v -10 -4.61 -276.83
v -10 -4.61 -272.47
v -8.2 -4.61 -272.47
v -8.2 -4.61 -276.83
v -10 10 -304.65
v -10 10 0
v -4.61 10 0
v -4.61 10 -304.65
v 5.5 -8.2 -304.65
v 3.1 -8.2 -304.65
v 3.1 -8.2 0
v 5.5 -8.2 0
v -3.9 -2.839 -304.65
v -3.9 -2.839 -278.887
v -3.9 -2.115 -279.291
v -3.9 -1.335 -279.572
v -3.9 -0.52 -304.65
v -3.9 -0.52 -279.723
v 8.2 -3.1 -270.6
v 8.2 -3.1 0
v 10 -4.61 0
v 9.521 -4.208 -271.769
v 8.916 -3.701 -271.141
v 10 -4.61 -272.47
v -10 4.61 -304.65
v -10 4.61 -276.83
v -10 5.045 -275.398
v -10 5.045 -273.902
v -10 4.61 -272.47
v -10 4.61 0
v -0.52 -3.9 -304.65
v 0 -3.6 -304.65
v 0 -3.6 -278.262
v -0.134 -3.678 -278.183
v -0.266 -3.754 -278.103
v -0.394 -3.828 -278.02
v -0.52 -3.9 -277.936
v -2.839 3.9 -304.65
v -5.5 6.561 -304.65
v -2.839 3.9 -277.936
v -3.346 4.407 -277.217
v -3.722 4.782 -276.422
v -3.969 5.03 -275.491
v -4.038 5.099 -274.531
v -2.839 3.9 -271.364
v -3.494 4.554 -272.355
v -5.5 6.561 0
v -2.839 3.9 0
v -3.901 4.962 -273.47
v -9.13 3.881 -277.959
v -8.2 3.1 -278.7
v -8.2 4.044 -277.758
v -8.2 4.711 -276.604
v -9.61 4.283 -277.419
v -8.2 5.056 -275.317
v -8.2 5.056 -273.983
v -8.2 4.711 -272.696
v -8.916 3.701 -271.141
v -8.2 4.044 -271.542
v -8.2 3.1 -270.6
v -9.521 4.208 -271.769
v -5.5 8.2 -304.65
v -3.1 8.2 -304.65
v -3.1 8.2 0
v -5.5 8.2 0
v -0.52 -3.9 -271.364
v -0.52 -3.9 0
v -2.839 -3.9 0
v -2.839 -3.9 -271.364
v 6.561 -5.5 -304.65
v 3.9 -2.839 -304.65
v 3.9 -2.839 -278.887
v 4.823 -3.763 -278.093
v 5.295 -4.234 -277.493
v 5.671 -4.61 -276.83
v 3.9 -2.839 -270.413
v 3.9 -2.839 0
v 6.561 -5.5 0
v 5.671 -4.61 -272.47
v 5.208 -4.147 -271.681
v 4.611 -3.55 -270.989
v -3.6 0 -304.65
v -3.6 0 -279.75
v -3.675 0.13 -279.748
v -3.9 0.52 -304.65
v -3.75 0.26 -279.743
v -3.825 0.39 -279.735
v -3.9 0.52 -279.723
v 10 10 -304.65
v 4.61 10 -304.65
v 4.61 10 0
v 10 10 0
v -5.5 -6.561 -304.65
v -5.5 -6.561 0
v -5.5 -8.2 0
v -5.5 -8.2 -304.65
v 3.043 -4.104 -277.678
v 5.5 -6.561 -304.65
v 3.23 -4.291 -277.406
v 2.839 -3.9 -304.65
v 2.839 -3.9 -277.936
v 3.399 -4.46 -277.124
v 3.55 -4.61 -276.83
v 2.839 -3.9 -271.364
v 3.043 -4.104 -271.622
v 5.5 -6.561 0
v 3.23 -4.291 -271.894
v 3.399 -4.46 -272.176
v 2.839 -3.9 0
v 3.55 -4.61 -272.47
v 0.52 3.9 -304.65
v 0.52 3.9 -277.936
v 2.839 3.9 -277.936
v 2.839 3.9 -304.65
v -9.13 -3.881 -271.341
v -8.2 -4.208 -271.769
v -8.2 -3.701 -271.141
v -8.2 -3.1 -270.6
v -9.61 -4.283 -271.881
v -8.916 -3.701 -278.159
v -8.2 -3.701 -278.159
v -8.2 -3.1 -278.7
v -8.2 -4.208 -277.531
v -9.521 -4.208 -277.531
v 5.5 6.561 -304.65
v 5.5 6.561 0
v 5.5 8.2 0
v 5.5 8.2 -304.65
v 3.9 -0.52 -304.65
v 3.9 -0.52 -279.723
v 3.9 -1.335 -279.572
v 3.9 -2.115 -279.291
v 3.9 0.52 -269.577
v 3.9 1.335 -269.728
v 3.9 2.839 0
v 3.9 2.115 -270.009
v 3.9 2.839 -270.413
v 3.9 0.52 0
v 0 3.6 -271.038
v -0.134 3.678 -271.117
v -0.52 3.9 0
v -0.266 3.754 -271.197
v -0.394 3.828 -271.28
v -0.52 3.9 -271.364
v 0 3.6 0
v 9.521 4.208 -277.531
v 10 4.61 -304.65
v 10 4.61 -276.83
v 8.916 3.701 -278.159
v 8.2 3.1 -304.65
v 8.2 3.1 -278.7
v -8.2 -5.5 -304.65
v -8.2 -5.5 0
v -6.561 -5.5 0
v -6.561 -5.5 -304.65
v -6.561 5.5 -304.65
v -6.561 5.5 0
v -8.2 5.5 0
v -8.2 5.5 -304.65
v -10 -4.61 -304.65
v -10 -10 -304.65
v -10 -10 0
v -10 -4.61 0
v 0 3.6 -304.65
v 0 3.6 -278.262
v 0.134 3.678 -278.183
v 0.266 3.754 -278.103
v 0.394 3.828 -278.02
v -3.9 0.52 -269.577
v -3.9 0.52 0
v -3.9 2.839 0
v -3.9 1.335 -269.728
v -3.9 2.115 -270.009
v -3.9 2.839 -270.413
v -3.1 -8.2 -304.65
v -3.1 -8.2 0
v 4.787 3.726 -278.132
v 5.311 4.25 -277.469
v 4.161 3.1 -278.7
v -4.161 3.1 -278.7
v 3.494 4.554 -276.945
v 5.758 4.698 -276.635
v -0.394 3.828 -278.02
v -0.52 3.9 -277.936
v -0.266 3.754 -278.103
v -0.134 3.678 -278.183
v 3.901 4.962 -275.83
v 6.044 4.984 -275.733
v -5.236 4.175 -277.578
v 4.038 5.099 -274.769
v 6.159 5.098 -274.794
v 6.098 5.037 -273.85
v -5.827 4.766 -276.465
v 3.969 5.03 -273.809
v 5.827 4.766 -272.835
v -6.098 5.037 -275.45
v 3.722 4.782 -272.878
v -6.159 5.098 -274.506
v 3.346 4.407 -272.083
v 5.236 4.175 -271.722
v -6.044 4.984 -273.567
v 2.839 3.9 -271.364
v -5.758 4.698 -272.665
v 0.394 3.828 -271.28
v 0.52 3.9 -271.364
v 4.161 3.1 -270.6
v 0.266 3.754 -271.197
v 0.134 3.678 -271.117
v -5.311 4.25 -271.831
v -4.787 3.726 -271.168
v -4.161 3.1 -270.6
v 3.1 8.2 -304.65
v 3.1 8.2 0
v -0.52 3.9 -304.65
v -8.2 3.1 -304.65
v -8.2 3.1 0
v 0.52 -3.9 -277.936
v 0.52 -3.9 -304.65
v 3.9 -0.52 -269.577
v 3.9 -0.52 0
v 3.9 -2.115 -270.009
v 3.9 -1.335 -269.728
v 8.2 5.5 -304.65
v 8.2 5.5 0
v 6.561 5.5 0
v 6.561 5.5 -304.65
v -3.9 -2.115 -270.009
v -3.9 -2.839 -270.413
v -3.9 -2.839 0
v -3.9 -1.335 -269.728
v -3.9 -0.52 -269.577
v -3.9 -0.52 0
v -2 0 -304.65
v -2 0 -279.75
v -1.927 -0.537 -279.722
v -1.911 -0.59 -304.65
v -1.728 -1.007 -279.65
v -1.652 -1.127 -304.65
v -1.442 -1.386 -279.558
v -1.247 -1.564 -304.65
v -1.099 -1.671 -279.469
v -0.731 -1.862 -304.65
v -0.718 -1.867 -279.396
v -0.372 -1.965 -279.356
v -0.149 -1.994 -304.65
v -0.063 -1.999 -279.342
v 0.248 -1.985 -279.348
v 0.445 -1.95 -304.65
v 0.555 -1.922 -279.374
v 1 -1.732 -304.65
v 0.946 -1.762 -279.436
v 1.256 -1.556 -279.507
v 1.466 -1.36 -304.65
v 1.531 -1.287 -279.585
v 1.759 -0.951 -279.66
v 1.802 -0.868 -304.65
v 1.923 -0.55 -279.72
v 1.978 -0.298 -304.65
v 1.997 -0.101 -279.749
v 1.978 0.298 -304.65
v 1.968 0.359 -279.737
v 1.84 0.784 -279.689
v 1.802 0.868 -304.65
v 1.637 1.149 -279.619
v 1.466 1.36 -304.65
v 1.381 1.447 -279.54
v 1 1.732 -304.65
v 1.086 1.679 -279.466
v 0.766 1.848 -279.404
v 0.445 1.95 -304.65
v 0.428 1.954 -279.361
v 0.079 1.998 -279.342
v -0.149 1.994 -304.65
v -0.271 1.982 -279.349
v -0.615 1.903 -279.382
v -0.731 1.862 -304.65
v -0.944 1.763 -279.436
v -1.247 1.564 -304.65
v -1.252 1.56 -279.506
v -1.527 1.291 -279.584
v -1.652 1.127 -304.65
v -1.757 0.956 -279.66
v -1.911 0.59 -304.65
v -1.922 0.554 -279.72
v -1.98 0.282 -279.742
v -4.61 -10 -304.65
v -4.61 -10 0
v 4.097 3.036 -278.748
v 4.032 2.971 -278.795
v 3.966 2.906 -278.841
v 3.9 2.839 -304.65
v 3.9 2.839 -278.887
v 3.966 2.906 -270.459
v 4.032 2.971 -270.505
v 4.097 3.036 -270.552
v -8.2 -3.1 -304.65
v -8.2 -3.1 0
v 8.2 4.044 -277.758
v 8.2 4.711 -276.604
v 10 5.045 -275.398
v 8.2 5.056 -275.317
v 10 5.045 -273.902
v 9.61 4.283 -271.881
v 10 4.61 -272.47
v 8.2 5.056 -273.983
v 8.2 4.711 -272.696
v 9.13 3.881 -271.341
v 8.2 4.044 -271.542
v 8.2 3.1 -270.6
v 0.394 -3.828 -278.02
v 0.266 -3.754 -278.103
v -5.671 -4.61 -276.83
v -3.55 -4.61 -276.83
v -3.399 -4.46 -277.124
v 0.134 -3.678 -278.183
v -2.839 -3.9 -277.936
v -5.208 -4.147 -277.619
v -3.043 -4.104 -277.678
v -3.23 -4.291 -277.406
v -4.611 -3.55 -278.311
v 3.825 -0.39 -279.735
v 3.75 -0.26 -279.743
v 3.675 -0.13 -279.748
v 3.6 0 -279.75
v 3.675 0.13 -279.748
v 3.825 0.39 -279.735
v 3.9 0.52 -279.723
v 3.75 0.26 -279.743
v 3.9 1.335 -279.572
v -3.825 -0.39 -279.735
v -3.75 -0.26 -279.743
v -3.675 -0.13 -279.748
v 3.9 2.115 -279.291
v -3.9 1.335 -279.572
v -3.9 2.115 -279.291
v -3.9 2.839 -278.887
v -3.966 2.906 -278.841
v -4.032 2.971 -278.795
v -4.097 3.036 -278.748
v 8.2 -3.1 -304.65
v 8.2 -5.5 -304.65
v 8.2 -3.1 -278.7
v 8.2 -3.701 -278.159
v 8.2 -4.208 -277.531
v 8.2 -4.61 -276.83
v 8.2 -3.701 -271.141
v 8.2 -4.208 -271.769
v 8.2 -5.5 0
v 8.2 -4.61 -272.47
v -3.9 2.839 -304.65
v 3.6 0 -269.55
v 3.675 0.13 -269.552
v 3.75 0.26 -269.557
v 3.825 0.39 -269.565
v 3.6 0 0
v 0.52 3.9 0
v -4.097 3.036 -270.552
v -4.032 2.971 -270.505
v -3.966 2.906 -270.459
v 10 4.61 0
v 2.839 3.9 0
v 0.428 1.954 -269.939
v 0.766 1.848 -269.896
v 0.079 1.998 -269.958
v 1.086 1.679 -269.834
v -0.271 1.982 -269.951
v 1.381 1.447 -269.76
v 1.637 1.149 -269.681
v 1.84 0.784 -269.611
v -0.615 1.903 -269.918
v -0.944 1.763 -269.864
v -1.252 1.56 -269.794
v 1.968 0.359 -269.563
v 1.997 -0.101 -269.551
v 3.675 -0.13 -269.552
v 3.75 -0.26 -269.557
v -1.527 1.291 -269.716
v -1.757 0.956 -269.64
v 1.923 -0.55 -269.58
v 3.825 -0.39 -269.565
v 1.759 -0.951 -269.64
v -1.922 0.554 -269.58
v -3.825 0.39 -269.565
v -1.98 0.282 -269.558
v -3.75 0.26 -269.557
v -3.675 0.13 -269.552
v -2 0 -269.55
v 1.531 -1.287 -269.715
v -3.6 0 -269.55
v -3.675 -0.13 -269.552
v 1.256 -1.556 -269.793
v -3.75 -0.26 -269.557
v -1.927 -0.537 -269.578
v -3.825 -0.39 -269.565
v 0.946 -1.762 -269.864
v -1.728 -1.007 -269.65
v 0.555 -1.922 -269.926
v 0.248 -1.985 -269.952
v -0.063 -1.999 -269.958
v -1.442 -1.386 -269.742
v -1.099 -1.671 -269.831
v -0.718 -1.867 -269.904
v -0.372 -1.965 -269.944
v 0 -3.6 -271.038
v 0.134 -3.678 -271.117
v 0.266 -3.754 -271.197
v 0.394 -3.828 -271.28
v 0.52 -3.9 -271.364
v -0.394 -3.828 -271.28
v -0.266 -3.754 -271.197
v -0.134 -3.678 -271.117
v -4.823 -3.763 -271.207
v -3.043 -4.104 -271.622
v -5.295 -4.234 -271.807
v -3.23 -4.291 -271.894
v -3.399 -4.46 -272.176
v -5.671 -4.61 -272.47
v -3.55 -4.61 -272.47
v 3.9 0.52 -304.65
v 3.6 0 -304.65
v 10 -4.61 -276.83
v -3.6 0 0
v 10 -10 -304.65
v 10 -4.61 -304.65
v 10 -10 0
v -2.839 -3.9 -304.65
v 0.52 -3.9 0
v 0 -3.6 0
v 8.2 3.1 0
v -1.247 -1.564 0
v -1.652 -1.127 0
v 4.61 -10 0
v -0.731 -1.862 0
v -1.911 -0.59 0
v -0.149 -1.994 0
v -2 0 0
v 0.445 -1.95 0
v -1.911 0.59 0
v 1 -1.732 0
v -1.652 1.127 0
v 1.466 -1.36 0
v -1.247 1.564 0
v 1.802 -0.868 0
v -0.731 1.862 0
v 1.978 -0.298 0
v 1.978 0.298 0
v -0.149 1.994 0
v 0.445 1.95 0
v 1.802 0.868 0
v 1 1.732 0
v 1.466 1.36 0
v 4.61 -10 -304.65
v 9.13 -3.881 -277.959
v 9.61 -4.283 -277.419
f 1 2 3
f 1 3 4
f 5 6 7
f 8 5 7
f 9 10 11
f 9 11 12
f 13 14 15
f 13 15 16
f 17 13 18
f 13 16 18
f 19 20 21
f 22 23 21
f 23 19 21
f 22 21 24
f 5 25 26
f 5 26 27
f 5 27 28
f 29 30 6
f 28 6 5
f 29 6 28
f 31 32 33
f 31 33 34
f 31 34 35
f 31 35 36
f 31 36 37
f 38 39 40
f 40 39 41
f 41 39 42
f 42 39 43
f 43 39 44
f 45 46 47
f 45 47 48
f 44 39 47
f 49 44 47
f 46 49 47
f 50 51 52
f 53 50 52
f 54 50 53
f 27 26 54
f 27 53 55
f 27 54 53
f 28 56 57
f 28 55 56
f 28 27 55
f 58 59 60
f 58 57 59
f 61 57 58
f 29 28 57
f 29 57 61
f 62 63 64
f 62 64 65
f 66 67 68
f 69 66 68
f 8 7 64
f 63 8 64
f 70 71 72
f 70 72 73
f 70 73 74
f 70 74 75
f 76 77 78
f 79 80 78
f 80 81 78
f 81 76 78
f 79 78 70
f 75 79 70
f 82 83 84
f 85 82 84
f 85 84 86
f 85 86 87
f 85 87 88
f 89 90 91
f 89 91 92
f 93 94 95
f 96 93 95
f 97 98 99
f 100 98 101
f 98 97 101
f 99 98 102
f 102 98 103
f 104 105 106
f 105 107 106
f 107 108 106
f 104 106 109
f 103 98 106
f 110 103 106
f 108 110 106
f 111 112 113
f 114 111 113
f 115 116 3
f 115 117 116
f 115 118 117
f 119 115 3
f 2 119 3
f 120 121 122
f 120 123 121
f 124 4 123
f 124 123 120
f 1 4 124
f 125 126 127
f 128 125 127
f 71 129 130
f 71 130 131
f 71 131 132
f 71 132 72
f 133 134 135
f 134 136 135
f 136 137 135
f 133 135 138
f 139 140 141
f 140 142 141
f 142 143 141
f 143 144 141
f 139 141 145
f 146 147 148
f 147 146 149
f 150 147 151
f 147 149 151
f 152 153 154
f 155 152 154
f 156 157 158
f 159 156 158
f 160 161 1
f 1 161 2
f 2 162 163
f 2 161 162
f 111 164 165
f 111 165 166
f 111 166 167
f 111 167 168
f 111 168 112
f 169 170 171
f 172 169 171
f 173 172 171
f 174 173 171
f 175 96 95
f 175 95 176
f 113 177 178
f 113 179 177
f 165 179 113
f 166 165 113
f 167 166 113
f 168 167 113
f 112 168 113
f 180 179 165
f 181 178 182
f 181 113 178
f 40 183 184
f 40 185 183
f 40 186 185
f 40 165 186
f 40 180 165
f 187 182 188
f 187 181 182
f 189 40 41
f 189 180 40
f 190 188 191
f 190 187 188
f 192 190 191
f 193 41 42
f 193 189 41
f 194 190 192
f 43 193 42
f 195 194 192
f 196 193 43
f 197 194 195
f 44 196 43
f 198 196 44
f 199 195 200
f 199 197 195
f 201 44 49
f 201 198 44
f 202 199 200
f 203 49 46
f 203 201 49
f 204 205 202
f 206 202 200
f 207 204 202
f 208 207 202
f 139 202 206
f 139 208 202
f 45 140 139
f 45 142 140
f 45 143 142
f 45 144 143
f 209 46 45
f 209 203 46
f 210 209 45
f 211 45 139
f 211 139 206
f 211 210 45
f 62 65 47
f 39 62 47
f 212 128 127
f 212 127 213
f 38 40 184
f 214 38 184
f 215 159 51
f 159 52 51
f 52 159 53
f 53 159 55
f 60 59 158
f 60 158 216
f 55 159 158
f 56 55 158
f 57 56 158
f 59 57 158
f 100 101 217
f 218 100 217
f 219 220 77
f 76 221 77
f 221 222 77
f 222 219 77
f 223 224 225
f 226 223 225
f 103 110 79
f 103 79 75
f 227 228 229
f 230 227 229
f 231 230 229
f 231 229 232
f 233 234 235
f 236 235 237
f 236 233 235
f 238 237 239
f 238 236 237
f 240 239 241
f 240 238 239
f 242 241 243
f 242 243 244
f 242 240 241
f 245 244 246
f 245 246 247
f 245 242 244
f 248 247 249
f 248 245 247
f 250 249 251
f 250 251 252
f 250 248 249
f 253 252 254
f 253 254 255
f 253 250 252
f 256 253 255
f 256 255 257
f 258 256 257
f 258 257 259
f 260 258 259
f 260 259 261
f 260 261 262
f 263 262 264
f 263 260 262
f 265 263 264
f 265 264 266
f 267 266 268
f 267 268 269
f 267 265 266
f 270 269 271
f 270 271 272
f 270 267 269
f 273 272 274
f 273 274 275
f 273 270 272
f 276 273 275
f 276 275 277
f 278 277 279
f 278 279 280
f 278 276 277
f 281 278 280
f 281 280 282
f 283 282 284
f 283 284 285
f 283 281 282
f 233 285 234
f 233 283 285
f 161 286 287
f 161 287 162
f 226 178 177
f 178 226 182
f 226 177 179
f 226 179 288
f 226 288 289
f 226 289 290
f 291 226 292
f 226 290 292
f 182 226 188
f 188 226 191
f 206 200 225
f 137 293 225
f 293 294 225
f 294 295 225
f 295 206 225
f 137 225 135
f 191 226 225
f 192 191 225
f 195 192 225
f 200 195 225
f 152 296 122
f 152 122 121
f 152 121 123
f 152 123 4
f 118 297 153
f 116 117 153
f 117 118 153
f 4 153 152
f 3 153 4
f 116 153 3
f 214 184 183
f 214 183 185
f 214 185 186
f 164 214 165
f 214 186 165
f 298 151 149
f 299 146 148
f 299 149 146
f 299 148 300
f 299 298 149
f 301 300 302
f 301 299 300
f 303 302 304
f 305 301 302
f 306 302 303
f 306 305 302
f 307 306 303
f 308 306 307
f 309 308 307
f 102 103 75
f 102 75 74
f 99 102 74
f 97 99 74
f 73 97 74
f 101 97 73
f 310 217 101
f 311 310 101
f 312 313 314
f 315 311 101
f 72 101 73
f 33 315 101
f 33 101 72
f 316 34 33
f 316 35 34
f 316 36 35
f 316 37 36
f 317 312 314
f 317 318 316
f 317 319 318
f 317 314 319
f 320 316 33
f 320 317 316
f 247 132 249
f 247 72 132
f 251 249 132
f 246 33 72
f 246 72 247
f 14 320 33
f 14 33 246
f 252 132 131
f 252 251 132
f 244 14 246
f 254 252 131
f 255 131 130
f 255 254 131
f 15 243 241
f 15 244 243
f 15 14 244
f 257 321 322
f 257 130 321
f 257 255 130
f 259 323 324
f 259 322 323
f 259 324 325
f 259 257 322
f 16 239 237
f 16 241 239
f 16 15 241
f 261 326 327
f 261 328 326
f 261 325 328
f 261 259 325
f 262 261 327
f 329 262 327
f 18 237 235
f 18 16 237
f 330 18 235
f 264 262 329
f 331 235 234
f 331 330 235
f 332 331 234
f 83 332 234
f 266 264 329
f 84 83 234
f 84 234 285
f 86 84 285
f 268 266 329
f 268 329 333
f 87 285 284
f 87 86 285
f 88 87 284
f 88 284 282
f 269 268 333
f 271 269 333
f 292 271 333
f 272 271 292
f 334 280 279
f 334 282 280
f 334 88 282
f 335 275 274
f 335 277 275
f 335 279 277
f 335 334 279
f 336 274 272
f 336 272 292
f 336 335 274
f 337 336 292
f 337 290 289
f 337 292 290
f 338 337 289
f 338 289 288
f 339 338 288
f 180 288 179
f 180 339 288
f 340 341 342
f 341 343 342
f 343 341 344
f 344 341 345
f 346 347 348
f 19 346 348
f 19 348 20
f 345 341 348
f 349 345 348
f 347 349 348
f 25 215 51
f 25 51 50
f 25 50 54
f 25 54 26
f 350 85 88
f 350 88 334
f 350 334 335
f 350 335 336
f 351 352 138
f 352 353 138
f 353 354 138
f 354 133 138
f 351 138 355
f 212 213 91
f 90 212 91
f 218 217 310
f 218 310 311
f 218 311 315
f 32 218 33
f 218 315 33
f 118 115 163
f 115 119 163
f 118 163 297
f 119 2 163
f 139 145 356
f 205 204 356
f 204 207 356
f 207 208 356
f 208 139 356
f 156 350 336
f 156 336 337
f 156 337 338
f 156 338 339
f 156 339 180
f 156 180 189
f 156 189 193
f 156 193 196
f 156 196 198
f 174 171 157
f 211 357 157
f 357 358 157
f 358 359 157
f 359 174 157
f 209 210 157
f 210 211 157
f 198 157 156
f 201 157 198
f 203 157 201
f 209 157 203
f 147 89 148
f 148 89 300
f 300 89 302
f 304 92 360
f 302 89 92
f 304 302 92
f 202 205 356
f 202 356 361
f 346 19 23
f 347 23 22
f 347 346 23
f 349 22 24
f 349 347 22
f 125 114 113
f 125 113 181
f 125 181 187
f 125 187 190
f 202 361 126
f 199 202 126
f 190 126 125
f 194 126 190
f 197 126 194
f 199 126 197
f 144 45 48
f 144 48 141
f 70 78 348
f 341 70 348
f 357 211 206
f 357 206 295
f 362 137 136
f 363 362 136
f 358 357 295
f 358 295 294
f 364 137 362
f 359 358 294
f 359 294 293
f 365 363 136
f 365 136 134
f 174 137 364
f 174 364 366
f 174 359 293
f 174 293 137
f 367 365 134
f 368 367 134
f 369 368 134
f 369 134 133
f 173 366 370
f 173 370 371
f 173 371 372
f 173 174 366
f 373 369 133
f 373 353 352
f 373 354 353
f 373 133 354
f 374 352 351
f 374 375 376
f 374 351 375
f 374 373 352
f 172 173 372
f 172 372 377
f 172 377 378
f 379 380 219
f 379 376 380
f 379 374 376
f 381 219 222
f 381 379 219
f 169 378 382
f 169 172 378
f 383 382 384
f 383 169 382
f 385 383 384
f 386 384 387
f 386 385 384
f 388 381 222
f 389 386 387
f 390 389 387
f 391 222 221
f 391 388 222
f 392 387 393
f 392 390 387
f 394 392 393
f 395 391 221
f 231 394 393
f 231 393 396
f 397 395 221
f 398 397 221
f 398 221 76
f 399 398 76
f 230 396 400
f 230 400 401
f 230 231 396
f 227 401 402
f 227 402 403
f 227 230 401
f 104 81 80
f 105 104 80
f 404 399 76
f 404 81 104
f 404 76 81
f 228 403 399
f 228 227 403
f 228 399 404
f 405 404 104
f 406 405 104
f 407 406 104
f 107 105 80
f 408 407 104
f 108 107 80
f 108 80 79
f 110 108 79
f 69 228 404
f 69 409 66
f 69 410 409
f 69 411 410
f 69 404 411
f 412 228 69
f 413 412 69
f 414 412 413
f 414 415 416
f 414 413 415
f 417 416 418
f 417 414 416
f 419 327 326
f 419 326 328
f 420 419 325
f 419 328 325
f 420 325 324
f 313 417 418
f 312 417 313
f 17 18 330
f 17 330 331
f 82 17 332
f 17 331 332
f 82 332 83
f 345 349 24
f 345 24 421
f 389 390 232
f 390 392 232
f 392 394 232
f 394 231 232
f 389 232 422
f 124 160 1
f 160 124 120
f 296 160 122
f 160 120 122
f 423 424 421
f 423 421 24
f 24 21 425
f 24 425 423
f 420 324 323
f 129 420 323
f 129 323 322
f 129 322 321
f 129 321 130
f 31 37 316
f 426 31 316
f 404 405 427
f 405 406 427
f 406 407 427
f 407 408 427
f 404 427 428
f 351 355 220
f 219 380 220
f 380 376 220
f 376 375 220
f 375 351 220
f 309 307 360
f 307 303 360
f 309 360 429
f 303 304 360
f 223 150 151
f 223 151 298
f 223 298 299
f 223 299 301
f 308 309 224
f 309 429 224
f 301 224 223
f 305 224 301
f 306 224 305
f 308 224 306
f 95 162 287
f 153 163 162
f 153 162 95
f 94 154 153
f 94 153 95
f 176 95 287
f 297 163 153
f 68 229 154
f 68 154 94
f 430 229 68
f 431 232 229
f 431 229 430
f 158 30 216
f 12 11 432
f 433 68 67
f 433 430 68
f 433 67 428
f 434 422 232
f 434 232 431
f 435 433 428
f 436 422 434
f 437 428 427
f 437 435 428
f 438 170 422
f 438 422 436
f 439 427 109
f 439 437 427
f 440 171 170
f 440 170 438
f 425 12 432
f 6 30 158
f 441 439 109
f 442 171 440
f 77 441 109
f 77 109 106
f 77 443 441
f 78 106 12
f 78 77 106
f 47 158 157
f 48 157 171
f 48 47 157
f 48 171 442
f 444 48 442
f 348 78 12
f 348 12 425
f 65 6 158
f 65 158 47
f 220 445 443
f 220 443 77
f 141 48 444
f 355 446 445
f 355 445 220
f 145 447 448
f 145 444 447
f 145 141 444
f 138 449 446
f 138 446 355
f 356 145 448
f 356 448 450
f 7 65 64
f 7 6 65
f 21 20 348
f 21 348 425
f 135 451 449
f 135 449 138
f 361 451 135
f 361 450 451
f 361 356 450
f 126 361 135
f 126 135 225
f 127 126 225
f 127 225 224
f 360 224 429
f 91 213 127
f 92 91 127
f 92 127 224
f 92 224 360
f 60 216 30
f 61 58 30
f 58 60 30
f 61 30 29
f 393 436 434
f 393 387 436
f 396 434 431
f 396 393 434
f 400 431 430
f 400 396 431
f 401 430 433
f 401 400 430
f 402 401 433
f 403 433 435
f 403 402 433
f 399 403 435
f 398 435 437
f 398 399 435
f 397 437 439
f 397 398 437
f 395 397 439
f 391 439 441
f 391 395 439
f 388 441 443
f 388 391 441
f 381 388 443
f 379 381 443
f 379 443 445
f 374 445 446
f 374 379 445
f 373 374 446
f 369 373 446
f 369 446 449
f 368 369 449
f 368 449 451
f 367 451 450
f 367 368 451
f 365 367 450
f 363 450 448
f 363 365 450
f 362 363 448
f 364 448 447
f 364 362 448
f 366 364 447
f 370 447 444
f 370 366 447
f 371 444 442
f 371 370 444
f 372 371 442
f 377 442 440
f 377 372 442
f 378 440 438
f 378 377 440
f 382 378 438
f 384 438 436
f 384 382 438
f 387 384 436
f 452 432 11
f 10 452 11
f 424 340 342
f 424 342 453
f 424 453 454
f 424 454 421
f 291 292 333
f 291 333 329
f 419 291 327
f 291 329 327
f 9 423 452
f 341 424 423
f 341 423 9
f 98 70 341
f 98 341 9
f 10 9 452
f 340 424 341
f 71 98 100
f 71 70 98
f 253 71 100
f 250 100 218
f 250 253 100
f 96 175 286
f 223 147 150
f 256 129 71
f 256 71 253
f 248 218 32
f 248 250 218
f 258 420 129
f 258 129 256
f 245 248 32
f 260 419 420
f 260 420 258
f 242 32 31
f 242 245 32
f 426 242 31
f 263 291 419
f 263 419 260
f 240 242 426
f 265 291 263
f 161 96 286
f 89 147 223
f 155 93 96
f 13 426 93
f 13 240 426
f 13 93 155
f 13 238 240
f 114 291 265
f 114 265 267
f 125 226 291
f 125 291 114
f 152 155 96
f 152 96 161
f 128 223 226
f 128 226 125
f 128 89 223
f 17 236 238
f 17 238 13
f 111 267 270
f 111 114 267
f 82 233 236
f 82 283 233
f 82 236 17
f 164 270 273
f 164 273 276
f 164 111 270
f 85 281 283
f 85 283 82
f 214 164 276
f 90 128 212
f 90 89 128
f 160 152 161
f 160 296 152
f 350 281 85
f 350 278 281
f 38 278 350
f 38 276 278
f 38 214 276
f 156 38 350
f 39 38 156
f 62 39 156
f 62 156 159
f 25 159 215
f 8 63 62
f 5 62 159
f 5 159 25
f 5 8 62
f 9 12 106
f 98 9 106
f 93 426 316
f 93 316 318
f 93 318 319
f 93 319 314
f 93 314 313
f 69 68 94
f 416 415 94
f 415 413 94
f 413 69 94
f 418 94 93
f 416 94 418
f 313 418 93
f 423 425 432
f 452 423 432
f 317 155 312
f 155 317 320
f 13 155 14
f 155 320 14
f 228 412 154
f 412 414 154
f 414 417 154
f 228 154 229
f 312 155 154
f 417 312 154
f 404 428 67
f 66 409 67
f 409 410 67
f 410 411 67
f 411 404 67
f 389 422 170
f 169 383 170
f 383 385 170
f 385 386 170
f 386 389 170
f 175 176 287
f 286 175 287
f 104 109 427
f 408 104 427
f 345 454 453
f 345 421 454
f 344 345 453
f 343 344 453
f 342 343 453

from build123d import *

# Parameters (mm, degrees)
SKETCH1_R           = 2
BOSS_EXTRUDE1_DEPTH = 304.65
CUT_EXTRUDE1_START  = -20
CUT_EXTRUDE1_DEPTH  = 20
CUT_EXTRUDE2_START  = -304.65
SKETCH4_R           = 2
CUT_EXTRUDE2_DEPTH  = 304.65


# Read off the part's stored shape, not the designer's step: Cut-Extrude1
with BuildPart() as part:
    # Sketch1 → Boss-Extrude1 (new, symmetric)
    with BuildSketch(Plane.XY):
        Polygon((10, 10), (10, 4.610379336), (8.2, 3.1), (8.2, 5.5), (6.560660172, 5.5), (3.9, 2.839339828), (3.9, 0.519615242), (3.6, 0), (3.9, -0.519615242), (3.9, -2.839339828), (6.560660172, -5.5), (8.2, -5.5), (8.2, -3.1), (10, -4.610379336), (10, -10), (4.610379336, -10), (3.1, -8.2), (5.5, -8.2), (5.5, -6.560660172), (2.839339828, -3.9), (0.519615242, -3.9), (0, -3.6), (-0.519615242, -3.9), (-2.839339828, -3.9), (-5.5, -6.560660172), (-5.5, -8.2), (-3.1, -8.2), (-4.610379336, -10), (-10, -10), (-10, -4.610379336), (-8.2, -3.1), (-8.2, -5.5), (-6.560660172, -5.5), (-3.9, -2.839339828), (-3.9, -0.519615242), (-3.6, 0), (-3.9, 0.519615242), (-3.9, 2.839339828), (-6.560660172, 5.5), (-8.2, 5.5), (-8.2, 3.1), (-10, 4.610379336), (-10, 10), (-4.610379336, 10), (-3.1, 8.2), (-5.5, 8.2), (-5.5, 6.560660172), (-2.839339828, 3.9), (-0.519615242, 3.9), (0, 3.6), (0.519615242, 3.9), (2.839339828, 3.9), (5.5, 6.560660172), (5.5, 8.2), (3.1, 8.2), (4.610379336, 10), align=None)
        with Locations(Location((0, 0, 0), (0, 0, 180))):
            Circle(SKETCH1_R, mode=Mode.SUBTRACT)
    extrude(amount=BOSS_EXTRUDE1_DEPTH, both=True)

    # Cut-Extrude1 outline → Cut-Extrude1 (cut)
    with BuildSketch(Plane(origin=(10, 0, 0), x_dir=(0, 0, -1), z_dir=(1, 0, 0)).offset(CUT_EXTRUDE1_START)):
        with BuildLine():
            Line((272.469540788, -4.610379336), (276.830459212, -4.610379336))
            ThreePointArc((276.830459212, -4.610379336), (279.606428288, -1.201590041), (278.699691346, 3.1))
            ThreePointArc((278.699691346, 3.1), (274.65, 5.1), (270.600308654, 3.1))
            ThreePointArc((270.600308654, 3.1), (269.693571712, -1.201590041), (272.469540788, -4.610379336))
        make_face()
    extrude(amount=CUT_EXTRUDE1_DEPTH, mode=Mode.SUBTRACT)

    # Sketch4 → Cut-Extrude2 (cut)
    with BuildSketch(Plane.XY.offset(304.65).offset(CUT_EXTRUDE2_START)):
        Polygon((-5.5, 6.560660172), (-5.5, 8.2), (-3.1, 8.2), (-4.610379336, 10), (-10, 10), (-10, 4.610379336), (-8.2, 3.1), (-8.2, 5.5), (-6.560660172, 5.5), (-3.9, 2.839339828), (-3.9, 0.519615242), (-3.6, 0), (-3.9, -0.519615242), (-3.9, -2.839339828), (-6.560660172, -5.5), (-8.2, -5.5), (-8.2, -3.1), (-10, -4.610379336), (-10, -10), (-4.610379336, -10), (-3.1, -8.2), (-5.5, -8.2), (-5.5, -6.560660172), (-2.839339828, -3.9), (-0.519615242, -3.9), (0, -3.6), (0.519615242, -3.9), (2.839339828, -3.9), (5.5, -6.560660172), (5.5, -8.2), (3.1, -8.2), (4.610379336, -10), (10, -10), (10, -4.610379336), (8.2, -3.1), (8.2, -5.5), (6.560660172, -5.5), (3.9, -2.839339828), (3.9, -0.519615242), (3.6, 0), (3.9, 0.519615242), (3.9, 2.839339828), (6.560660172, 5.5), (8.2, 5.5), (8.2, 3.1), (10, 4.610379336), (10, 10), (4.610379336, 10), (3.1, 8.2), (5.5, 8.2), (5.5, 6.560660172), (2.839339828, 3.9), (0.519615242, 3.9), (0, 3.6), (-0.519615242, 3.9), (-2.839339828, 3.9), align=None)
        with Locations(Location((0, 0, 0), (0, 0, 180))):
            Circle(SKETCH4_R, mode=Mode.SUBTRACT)
    extrude(amount=CUT_EXTRUDE2_DEPTH, mode=Mode.SUBTRACT)


solid = part.part
